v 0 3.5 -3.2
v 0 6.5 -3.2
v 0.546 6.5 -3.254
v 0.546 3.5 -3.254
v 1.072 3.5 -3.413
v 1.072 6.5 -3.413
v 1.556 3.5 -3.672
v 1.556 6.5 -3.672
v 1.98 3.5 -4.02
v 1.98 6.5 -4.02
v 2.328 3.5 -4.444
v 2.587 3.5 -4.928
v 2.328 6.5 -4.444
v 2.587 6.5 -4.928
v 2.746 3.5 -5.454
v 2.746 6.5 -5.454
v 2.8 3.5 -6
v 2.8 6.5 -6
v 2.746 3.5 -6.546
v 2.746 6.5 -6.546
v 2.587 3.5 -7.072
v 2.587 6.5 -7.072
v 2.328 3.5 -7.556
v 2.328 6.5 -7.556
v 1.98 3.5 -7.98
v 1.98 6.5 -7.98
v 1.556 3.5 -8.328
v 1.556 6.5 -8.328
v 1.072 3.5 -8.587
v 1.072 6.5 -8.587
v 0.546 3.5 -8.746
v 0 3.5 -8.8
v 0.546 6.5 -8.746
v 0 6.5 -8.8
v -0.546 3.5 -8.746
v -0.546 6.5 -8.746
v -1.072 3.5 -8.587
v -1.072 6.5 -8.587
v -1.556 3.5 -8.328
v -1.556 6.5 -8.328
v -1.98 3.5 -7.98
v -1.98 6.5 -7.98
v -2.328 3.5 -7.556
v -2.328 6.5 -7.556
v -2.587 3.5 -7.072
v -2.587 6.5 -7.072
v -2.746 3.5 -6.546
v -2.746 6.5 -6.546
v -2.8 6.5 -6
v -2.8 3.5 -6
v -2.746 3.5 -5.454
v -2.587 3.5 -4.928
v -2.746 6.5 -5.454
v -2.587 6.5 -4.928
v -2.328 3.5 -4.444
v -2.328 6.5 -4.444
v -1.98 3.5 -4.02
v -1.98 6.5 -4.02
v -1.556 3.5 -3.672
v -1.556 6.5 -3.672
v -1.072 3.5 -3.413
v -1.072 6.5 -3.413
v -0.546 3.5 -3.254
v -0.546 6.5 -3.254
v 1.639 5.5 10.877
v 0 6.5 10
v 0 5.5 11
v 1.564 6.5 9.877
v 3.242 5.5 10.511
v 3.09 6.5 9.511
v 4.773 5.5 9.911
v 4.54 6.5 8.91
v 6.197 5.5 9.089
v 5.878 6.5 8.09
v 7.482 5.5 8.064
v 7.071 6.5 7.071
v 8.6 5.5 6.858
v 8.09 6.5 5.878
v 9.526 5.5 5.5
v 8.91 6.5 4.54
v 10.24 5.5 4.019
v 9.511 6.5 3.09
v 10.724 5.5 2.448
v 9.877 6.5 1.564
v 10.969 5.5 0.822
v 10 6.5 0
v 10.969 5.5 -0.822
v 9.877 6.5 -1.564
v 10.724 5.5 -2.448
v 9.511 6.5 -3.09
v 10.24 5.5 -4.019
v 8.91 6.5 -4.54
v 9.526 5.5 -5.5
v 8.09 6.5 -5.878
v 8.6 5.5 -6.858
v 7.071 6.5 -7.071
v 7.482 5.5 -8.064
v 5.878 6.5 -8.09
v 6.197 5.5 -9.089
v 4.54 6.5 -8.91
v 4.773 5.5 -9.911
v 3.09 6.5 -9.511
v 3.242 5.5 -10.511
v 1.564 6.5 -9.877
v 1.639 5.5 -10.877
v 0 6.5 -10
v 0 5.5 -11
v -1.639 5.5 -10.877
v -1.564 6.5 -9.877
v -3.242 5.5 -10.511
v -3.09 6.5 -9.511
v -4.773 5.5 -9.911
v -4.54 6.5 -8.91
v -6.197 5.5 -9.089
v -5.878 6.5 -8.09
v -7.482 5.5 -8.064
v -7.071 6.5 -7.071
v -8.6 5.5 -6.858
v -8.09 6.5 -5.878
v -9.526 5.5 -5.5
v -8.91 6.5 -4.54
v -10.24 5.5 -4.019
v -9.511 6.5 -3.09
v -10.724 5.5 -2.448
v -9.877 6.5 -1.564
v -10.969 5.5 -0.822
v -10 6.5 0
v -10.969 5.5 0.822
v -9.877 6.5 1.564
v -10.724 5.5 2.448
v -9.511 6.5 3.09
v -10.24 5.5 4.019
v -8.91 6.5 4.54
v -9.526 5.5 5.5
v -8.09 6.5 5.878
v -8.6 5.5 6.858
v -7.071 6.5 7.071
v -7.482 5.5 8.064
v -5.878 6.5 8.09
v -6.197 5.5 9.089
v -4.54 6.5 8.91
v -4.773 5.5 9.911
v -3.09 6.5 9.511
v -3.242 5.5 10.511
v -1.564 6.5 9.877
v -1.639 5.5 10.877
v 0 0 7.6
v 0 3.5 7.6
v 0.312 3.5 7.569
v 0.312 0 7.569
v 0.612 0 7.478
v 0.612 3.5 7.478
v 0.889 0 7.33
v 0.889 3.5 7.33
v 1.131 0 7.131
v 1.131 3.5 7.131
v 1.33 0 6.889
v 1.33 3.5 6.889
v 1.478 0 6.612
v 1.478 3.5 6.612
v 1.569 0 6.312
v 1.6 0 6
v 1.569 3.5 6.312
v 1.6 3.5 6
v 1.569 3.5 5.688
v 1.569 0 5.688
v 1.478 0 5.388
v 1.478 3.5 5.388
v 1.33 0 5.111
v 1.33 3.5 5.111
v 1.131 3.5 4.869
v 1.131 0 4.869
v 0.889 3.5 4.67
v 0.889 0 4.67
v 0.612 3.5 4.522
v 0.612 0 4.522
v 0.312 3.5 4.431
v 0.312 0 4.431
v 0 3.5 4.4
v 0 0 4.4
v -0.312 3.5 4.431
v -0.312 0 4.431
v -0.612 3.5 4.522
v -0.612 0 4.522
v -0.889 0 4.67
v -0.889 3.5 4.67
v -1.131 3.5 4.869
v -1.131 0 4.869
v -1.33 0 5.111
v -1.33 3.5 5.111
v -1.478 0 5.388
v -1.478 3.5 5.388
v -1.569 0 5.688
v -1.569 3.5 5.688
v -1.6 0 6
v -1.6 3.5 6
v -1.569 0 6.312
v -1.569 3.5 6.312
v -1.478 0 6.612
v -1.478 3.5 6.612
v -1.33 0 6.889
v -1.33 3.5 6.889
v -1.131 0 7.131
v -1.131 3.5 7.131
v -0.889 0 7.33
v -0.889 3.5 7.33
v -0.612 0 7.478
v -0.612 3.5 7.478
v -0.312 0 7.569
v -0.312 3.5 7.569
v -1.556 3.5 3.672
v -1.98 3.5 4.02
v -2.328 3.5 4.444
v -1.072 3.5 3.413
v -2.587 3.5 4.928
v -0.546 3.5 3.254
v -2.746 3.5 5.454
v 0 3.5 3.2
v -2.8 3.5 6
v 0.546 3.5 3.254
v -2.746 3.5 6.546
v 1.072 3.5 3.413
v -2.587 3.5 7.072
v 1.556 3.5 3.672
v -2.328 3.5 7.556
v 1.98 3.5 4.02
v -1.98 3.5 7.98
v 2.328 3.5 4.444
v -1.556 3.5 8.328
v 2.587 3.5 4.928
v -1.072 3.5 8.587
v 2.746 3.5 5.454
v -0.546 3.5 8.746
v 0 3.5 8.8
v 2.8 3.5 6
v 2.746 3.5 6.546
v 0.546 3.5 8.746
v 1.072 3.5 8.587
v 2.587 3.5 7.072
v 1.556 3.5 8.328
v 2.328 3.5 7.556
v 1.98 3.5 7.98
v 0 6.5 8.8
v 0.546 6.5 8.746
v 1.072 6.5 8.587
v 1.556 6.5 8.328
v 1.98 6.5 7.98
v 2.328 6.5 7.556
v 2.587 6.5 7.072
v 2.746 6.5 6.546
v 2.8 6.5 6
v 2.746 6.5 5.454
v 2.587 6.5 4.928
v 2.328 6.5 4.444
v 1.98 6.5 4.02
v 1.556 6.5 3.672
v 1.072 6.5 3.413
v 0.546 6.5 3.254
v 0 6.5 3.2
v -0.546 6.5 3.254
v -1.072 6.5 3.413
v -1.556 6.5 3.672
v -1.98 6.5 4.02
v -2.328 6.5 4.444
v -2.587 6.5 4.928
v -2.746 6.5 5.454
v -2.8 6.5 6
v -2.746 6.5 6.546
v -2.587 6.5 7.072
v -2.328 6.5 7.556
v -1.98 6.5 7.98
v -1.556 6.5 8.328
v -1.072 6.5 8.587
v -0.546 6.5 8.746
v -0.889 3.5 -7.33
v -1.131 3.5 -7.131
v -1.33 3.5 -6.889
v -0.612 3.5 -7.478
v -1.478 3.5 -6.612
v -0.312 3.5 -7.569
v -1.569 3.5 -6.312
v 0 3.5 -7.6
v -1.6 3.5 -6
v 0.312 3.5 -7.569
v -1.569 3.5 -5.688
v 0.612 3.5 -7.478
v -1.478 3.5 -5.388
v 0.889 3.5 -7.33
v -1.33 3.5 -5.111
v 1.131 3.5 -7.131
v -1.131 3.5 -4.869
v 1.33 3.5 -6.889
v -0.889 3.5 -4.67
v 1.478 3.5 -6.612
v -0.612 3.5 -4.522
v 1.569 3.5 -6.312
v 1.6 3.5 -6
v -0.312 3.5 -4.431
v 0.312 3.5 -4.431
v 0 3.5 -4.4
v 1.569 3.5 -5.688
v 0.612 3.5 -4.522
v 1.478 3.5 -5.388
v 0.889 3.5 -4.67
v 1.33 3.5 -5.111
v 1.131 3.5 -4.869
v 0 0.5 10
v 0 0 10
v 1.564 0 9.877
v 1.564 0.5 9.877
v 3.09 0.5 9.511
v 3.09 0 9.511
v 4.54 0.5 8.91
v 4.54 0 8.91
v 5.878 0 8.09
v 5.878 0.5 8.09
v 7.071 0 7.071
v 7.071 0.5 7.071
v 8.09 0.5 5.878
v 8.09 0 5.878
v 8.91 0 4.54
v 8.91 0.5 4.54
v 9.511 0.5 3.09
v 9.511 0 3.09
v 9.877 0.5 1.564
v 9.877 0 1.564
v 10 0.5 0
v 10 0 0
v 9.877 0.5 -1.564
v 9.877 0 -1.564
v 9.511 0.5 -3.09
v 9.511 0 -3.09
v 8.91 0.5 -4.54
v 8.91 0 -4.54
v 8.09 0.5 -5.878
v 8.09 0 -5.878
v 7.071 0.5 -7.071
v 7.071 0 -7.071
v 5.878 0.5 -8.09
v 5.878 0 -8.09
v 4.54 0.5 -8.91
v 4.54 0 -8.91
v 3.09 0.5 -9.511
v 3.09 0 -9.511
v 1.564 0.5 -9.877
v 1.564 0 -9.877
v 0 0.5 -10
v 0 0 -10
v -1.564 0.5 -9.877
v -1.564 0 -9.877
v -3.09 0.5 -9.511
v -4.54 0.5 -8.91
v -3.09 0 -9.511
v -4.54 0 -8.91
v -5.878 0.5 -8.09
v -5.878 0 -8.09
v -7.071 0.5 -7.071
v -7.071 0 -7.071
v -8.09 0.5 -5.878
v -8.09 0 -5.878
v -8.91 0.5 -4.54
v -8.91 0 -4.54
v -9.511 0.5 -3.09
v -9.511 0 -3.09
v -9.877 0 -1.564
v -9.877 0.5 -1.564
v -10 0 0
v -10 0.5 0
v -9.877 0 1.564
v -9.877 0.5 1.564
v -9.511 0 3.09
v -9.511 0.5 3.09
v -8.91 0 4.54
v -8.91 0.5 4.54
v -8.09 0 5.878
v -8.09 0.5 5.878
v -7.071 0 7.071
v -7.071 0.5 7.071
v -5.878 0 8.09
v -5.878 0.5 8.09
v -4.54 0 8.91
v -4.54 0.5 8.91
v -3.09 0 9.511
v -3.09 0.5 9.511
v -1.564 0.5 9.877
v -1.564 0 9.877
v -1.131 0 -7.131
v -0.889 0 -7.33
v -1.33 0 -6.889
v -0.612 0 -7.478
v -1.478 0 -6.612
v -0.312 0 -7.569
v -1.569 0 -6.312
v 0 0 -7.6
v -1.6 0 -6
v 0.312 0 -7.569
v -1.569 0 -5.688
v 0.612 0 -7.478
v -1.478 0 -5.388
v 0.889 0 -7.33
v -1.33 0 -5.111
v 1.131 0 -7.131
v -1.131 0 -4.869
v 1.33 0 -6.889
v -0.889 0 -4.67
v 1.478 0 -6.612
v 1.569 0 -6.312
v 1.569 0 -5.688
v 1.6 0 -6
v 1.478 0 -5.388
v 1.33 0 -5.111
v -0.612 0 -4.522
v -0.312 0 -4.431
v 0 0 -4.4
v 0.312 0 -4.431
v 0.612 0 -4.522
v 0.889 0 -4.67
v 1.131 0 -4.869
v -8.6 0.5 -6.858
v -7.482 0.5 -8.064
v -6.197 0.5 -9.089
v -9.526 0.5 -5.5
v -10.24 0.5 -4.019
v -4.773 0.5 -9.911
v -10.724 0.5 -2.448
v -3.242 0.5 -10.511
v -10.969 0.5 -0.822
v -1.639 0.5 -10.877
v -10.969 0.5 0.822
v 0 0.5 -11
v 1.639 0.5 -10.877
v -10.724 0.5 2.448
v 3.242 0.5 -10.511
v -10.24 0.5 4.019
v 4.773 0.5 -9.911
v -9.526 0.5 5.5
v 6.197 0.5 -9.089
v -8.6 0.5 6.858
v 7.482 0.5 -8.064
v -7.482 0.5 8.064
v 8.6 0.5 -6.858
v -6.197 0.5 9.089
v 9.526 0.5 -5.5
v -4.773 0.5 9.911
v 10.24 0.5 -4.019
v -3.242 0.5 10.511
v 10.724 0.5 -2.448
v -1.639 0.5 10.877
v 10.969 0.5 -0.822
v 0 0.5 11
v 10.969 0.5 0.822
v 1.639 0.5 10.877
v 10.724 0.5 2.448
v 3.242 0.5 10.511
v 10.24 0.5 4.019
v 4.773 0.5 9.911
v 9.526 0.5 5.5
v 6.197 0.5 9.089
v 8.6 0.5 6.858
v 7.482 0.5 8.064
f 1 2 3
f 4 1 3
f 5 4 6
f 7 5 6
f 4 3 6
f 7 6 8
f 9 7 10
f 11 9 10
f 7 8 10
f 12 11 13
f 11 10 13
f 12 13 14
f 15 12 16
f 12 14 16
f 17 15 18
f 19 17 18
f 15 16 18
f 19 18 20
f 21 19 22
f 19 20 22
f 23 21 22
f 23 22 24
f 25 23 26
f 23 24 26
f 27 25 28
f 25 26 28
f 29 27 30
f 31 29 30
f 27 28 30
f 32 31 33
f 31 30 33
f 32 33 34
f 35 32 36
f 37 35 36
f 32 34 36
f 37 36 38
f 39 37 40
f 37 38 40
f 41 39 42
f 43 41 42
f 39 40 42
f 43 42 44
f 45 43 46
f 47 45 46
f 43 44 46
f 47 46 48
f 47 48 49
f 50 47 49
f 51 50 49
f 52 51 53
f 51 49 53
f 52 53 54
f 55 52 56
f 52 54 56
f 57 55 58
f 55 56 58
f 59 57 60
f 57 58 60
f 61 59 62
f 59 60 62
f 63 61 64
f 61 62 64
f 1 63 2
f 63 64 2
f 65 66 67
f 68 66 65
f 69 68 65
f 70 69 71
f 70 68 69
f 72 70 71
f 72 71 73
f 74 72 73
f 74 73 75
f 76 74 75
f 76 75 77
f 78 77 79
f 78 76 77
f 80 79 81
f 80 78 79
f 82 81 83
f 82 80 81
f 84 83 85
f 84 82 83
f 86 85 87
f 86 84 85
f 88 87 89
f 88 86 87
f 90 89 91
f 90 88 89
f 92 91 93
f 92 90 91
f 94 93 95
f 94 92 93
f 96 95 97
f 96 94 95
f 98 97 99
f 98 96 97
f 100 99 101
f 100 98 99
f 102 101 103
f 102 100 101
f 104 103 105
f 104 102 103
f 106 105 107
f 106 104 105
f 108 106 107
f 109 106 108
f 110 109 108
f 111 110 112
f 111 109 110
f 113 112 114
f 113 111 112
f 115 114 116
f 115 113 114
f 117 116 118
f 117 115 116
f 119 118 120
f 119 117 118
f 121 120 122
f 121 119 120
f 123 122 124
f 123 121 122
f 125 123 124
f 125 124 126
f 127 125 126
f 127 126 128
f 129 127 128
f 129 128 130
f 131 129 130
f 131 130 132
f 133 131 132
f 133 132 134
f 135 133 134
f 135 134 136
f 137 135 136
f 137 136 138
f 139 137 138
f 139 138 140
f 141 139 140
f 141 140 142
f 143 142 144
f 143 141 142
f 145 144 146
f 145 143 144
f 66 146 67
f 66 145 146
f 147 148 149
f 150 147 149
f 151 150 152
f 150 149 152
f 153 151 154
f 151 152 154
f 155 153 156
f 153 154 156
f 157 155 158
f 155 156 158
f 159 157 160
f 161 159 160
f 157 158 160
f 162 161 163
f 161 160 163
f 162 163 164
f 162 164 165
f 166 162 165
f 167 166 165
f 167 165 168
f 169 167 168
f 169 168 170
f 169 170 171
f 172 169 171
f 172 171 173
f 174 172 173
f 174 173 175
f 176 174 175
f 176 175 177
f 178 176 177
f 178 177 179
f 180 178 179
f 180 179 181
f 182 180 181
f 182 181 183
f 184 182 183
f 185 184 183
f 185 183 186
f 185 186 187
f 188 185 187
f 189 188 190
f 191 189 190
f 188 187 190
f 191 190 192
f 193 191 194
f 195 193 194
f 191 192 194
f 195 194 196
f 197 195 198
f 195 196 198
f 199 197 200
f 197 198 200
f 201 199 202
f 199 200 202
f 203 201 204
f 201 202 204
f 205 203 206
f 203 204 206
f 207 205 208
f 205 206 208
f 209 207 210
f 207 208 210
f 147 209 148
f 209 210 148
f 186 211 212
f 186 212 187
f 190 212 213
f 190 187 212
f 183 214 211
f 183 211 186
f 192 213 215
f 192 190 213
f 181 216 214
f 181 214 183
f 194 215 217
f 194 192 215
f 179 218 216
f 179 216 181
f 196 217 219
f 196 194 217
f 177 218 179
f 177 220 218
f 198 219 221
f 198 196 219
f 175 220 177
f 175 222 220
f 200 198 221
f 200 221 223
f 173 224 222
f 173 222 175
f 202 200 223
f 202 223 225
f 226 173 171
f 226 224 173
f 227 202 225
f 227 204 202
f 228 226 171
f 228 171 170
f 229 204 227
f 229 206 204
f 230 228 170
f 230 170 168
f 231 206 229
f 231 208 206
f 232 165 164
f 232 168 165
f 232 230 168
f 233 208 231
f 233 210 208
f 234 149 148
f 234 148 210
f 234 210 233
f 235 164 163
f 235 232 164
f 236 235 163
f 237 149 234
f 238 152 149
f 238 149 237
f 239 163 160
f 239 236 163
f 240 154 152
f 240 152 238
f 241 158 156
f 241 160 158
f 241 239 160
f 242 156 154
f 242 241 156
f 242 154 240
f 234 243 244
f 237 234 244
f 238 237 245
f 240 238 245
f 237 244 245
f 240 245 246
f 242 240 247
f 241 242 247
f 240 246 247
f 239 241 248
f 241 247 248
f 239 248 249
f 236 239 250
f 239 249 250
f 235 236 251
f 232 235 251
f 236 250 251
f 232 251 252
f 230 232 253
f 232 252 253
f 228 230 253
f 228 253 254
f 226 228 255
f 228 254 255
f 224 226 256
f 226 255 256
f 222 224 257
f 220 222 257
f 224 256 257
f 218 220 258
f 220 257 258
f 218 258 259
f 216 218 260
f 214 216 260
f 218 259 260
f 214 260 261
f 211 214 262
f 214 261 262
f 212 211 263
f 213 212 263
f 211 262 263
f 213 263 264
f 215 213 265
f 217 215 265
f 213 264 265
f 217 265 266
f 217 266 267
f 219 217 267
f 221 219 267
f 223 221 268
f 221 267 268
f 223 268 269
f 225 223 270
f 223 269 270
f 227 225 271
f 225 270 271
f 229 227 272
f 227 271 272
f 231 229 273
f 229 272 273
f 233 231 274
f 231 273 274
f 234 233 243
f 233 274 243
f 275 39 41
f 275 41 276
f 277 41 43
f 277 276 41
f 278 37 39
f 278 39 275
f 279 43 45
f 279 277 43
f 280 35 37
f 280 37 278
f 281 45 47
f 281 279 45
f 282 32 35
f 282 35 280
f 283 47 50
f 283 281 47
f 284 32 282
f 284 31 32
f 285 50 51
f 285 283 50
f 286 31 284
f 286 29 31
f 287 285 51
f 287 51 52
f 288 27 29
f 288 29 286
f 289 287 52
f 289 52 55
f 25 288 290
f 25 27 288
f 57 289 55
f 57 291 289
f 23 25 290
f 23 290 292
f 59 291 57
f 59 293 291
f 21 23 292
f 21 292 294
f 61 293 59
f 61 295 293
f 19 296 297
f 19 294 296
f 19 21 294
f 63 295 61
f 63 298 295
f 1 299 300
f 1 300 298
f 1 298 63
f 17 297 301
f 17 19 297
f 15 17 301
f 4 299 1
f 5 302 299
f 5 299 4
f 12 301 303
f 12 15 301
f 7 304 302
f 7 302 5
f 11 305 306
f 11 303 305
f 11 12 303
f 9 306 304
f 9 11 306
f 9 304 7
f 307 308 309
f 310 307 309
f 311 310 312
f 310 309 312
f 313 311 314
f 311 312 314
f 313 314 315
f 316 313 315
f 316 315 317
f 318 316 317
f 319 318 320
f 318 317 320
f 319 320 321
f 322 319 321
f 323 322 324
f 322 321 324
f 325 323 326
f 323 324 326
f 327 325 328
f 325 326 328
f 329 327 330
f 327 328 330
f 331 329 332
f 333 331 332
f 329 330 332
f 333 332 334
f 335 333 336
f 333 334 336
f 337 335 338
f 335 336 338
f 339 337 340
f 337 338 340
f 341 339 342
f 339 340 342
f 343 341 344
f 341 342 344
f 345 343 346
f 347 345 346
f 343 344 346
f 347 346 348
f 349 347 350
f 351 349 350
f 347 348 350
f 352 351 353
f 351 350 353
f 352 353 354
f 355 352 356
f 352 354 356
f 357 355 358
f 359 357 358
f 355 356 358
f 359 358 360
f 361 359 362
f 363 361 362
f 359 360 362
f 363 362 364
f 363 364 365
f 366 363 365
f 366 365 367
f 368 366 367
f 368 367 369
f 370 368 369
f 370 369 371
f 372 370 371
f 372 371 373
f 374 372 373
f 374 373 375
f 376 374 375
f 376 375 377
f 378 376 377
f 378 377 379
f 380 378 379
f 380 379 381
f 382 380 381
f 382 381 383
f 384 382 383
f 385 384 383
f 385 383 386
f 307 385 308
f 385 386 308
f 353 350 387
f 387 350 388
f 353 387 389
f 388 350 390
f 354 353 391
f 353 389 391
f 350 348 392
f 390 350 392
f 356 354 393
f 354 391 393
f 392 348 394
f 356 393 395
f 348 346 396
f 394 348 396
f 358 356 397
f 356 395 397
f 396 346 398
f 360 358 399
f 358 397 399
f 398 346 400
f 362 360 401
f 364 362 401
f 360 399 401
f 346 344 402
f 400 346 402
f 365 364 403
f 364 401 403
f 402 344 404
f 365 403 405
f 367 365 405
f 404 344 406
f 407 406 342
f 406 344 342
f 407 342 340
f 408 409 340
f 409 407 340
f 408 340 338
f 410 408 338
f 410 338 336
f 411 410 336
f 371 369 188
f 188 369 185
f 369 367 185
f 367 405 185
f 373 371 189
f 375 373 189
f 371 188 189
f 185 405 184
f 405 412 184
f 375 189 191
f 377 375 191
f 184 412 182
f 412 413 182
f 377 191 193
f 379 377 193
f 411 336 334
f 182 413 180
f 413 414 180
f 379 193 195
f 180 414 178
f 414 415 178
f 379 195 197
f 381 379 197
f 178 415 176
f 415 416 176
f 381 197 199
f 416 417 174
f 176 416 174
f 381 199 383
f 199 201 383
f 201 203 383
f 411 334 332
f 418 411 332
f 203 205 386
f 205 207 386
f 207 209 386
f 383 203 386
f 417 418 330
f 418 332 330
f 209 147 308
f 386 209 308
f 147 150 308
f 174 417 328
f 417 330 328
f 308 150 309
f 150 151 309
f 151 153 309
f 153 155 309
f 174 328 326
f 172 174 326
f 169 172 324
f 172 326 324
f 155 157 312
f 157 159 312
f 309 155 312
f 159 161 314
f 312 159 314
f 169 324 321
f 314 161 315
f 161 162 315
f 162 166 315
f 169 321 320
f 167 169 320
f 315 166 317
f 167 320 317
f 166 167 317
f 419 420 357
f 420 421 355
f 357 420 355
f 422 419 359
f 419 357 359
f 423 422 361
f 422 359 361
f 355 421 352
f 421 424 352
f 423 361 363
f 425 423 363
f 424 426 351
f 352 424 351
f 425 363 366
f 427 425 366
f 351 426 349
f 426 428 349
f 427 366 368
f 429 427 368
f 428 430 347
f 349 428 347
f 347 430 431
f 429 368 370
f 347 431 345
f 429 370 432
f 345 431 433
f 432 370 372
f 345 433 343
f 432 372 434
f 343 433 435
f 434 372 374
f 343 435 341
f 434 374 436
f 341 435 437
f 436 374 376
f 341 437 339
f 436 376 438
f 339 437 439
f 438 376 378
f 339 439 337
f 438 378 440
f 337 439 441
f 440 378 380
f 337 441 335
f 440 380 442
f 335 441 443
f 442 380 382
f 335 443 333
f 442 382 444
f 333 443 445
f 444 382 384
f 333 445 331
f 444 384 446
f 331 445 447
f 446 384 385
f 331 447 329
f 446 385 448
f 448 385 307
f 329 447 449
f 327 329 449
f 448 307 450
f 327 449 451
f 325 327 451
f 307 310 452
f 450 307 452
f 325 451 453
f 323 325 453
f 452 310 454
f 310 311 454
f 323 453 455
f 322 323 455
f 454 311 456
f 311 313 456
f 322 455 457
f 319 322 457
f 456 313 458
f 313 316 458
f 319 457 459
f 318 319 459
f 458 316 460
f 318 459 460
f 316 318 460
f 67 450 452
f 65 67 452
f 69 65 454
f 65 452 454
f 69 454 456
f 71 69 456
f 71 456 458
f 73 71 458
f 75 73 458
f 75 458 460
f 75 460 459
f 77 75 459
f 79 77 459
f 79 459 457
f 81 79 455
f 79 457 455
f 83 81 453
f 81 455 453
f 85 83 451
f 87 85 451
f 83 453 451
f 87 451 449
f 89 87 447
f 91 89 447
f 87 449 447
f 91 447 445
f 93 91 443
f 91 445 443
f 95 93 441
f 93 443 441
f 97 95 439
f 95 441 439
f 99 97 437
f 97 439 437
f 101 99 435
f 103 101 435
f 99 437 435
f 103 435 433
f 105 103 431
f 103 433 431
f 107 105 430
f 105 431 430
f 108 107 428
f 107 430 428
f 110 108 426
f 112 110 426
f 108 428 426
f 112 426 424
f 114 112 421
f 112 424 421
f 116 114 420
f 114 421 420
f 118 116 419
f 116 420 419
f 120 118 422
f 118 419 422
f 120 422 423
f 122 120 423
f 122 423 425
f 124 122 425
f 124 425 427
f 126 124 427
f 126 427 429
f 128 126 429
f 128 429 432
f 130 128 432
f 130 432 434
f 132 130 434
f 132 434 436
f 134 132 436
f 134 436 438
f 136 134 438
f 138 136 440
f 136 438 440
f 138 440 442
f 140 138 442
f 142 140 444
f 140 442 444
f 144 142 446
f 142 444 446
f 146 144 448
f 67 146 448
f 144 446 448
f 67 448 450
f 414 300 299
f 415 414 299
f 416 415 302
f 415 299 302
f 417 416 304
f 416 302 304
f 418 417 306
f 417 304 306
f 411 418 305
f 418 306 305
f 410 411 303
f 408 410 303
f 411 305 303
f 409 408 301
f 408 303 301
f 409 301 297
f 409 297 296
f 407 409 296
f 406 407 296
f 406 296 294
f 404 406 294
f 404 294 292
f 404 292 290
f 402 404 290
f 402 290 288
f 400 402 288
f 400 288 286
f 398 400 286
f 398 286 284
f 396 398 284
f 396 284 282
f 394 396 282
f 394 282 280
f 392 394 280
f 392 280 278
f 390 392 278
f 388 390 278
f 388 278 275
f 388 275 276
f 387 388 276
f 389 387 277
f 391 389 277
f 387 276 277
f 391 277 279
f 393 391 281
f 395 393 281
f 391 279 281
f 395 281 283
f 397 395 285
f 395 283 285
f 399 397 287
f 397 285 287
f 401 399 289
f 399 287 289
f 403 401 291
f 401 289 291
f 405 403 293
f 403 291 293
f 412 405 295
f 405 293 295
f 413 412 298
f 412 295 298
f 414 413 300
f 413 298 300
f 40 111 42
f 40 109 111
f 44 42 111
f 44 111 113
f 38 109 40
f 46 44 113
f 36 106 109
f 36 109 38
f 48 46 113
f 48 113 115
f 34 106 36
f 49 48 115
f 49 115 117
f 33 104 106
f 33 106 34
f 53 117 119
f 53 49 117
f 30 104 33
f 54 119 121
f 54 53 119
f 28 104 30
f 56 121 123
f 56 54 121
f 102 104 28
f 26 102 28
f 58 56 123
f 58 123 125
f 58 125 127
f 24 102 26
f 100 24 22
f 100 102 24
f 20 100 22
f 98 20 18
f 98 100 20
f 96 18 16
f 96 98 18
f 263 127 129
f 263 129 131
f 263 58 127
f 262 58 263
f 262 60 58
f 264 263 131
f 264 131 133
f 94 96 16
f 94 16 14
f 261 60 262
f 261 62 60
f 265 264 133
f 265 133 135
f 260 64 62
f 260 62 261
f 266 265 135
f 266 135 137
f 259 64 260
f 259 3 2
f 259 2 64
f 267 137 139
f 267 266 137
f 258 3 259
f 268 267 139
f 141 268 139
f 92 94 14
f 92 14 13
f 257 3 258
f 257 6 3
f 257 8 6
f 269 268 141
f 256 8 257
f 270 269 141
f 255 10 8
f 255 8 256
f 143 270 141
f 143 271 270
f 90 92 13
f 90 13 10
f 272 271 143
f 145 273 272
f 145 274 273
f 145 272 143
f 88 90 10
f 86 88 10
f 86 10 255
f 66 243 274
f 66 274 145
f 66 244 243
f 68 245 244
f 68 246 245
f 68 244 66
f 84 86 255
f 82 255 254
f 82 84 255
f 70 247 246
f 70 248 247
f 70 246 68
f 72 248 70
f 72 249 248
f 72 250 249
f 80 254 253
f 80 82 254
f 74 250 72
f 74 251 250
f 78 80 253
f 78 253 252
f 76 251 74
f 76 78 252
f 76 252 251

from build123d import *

# Parameters (mm, degrees)
ESQUISSE1_R             = 10
BOSS_EXTRU_1_DEPTH      = 0.5
ESQUISSE2_R             = 11
BOSS_EXTRU_2_DEPTH      = 6
CHANFREIN1_SIZE         = 1
ESQUISSE3_R             = 1.6
ENL_V_MAT_EXTRU_1_DEPTH = 17.8597153
ESQUISSE4_R             = 2.8
ENL_V_MAT_EXTRU_2_DEPTH = 3


with BuildPart() as part:
    # Esquisse1 → Boss.-Extru.1 (new body)
    with BuildSketch(Plane(origin=(0, 0, 0), x_dir=(1, 0, 0), z_dir=(0, 1, 0))):
        with Locations(Location((0, 0, 0), (0, 0, 270))):
            Circle(ESQUISSE1_R)
    extrude(amount=BOSS_EXTRU_1_DEPTH)

    # Esquisse2 → Boss.-Extru.2 (add)
    with BuildSketch(Plane(origin=(0, 0.5, 0), x_dir=(1, 0, 0), z_dir=(0, 1, 0))):
        with Locations(Location((0, 0, 0), (0, 0, 270))):
            Circle(ESQUISSE2_R)
    extrude(amount=BOSS_EXTRU_2_DEPTH)

    # Chanfrein1
    chanfrein1_edges = [part.edges().sort_by_distance(p)[0] for p in [
        (0, 6.5, -11),
    ]]
    chamfer(chanfrein1_edges, length=CHANFREIN1_SIZE)

    # Esquisse3 → Enlèv. mat.-Extru.1 (cut, through all)
    with BuildSketch(Plane(origin=(0, 6.5, 0), x_dir=(1, 0, 0), z_dir=(0, 1, 0))):
        with Locations(Location((0, 6, 0), (0, 0, 270))):
            Circle(ESQUISSE3_R)
        with Locations(Location((0, -6, 0), (0, 0, 270))):
            Circle(ESQUISSE3_R)
    extrude(amount=-ENL_V_MAT_EXTRU_1_DEPTH, mode=Mode.SUBTRACT)

    # Esquisse4 → Enlèv. mat.-Extru.2 (cut)
    with BuildSketch(Plane(origin=(0, 6.5, 0), x_dir=(1, 0, 0), z_dir=(0, 1, 0))):
        with Locations(Location((0, 6, 0), (0, 0, 270))):
            Circle(ESQUISSE4_R)
        with Locations(Location((0, -6, 0), (0, 0, 270))):
            Circle(ESQUISSE4_R)
    extrude(amount=-ENL_V_MAT_EXTRU_2_DEPTH, mode=Mode.SUBTRACT)


solid = part.part
